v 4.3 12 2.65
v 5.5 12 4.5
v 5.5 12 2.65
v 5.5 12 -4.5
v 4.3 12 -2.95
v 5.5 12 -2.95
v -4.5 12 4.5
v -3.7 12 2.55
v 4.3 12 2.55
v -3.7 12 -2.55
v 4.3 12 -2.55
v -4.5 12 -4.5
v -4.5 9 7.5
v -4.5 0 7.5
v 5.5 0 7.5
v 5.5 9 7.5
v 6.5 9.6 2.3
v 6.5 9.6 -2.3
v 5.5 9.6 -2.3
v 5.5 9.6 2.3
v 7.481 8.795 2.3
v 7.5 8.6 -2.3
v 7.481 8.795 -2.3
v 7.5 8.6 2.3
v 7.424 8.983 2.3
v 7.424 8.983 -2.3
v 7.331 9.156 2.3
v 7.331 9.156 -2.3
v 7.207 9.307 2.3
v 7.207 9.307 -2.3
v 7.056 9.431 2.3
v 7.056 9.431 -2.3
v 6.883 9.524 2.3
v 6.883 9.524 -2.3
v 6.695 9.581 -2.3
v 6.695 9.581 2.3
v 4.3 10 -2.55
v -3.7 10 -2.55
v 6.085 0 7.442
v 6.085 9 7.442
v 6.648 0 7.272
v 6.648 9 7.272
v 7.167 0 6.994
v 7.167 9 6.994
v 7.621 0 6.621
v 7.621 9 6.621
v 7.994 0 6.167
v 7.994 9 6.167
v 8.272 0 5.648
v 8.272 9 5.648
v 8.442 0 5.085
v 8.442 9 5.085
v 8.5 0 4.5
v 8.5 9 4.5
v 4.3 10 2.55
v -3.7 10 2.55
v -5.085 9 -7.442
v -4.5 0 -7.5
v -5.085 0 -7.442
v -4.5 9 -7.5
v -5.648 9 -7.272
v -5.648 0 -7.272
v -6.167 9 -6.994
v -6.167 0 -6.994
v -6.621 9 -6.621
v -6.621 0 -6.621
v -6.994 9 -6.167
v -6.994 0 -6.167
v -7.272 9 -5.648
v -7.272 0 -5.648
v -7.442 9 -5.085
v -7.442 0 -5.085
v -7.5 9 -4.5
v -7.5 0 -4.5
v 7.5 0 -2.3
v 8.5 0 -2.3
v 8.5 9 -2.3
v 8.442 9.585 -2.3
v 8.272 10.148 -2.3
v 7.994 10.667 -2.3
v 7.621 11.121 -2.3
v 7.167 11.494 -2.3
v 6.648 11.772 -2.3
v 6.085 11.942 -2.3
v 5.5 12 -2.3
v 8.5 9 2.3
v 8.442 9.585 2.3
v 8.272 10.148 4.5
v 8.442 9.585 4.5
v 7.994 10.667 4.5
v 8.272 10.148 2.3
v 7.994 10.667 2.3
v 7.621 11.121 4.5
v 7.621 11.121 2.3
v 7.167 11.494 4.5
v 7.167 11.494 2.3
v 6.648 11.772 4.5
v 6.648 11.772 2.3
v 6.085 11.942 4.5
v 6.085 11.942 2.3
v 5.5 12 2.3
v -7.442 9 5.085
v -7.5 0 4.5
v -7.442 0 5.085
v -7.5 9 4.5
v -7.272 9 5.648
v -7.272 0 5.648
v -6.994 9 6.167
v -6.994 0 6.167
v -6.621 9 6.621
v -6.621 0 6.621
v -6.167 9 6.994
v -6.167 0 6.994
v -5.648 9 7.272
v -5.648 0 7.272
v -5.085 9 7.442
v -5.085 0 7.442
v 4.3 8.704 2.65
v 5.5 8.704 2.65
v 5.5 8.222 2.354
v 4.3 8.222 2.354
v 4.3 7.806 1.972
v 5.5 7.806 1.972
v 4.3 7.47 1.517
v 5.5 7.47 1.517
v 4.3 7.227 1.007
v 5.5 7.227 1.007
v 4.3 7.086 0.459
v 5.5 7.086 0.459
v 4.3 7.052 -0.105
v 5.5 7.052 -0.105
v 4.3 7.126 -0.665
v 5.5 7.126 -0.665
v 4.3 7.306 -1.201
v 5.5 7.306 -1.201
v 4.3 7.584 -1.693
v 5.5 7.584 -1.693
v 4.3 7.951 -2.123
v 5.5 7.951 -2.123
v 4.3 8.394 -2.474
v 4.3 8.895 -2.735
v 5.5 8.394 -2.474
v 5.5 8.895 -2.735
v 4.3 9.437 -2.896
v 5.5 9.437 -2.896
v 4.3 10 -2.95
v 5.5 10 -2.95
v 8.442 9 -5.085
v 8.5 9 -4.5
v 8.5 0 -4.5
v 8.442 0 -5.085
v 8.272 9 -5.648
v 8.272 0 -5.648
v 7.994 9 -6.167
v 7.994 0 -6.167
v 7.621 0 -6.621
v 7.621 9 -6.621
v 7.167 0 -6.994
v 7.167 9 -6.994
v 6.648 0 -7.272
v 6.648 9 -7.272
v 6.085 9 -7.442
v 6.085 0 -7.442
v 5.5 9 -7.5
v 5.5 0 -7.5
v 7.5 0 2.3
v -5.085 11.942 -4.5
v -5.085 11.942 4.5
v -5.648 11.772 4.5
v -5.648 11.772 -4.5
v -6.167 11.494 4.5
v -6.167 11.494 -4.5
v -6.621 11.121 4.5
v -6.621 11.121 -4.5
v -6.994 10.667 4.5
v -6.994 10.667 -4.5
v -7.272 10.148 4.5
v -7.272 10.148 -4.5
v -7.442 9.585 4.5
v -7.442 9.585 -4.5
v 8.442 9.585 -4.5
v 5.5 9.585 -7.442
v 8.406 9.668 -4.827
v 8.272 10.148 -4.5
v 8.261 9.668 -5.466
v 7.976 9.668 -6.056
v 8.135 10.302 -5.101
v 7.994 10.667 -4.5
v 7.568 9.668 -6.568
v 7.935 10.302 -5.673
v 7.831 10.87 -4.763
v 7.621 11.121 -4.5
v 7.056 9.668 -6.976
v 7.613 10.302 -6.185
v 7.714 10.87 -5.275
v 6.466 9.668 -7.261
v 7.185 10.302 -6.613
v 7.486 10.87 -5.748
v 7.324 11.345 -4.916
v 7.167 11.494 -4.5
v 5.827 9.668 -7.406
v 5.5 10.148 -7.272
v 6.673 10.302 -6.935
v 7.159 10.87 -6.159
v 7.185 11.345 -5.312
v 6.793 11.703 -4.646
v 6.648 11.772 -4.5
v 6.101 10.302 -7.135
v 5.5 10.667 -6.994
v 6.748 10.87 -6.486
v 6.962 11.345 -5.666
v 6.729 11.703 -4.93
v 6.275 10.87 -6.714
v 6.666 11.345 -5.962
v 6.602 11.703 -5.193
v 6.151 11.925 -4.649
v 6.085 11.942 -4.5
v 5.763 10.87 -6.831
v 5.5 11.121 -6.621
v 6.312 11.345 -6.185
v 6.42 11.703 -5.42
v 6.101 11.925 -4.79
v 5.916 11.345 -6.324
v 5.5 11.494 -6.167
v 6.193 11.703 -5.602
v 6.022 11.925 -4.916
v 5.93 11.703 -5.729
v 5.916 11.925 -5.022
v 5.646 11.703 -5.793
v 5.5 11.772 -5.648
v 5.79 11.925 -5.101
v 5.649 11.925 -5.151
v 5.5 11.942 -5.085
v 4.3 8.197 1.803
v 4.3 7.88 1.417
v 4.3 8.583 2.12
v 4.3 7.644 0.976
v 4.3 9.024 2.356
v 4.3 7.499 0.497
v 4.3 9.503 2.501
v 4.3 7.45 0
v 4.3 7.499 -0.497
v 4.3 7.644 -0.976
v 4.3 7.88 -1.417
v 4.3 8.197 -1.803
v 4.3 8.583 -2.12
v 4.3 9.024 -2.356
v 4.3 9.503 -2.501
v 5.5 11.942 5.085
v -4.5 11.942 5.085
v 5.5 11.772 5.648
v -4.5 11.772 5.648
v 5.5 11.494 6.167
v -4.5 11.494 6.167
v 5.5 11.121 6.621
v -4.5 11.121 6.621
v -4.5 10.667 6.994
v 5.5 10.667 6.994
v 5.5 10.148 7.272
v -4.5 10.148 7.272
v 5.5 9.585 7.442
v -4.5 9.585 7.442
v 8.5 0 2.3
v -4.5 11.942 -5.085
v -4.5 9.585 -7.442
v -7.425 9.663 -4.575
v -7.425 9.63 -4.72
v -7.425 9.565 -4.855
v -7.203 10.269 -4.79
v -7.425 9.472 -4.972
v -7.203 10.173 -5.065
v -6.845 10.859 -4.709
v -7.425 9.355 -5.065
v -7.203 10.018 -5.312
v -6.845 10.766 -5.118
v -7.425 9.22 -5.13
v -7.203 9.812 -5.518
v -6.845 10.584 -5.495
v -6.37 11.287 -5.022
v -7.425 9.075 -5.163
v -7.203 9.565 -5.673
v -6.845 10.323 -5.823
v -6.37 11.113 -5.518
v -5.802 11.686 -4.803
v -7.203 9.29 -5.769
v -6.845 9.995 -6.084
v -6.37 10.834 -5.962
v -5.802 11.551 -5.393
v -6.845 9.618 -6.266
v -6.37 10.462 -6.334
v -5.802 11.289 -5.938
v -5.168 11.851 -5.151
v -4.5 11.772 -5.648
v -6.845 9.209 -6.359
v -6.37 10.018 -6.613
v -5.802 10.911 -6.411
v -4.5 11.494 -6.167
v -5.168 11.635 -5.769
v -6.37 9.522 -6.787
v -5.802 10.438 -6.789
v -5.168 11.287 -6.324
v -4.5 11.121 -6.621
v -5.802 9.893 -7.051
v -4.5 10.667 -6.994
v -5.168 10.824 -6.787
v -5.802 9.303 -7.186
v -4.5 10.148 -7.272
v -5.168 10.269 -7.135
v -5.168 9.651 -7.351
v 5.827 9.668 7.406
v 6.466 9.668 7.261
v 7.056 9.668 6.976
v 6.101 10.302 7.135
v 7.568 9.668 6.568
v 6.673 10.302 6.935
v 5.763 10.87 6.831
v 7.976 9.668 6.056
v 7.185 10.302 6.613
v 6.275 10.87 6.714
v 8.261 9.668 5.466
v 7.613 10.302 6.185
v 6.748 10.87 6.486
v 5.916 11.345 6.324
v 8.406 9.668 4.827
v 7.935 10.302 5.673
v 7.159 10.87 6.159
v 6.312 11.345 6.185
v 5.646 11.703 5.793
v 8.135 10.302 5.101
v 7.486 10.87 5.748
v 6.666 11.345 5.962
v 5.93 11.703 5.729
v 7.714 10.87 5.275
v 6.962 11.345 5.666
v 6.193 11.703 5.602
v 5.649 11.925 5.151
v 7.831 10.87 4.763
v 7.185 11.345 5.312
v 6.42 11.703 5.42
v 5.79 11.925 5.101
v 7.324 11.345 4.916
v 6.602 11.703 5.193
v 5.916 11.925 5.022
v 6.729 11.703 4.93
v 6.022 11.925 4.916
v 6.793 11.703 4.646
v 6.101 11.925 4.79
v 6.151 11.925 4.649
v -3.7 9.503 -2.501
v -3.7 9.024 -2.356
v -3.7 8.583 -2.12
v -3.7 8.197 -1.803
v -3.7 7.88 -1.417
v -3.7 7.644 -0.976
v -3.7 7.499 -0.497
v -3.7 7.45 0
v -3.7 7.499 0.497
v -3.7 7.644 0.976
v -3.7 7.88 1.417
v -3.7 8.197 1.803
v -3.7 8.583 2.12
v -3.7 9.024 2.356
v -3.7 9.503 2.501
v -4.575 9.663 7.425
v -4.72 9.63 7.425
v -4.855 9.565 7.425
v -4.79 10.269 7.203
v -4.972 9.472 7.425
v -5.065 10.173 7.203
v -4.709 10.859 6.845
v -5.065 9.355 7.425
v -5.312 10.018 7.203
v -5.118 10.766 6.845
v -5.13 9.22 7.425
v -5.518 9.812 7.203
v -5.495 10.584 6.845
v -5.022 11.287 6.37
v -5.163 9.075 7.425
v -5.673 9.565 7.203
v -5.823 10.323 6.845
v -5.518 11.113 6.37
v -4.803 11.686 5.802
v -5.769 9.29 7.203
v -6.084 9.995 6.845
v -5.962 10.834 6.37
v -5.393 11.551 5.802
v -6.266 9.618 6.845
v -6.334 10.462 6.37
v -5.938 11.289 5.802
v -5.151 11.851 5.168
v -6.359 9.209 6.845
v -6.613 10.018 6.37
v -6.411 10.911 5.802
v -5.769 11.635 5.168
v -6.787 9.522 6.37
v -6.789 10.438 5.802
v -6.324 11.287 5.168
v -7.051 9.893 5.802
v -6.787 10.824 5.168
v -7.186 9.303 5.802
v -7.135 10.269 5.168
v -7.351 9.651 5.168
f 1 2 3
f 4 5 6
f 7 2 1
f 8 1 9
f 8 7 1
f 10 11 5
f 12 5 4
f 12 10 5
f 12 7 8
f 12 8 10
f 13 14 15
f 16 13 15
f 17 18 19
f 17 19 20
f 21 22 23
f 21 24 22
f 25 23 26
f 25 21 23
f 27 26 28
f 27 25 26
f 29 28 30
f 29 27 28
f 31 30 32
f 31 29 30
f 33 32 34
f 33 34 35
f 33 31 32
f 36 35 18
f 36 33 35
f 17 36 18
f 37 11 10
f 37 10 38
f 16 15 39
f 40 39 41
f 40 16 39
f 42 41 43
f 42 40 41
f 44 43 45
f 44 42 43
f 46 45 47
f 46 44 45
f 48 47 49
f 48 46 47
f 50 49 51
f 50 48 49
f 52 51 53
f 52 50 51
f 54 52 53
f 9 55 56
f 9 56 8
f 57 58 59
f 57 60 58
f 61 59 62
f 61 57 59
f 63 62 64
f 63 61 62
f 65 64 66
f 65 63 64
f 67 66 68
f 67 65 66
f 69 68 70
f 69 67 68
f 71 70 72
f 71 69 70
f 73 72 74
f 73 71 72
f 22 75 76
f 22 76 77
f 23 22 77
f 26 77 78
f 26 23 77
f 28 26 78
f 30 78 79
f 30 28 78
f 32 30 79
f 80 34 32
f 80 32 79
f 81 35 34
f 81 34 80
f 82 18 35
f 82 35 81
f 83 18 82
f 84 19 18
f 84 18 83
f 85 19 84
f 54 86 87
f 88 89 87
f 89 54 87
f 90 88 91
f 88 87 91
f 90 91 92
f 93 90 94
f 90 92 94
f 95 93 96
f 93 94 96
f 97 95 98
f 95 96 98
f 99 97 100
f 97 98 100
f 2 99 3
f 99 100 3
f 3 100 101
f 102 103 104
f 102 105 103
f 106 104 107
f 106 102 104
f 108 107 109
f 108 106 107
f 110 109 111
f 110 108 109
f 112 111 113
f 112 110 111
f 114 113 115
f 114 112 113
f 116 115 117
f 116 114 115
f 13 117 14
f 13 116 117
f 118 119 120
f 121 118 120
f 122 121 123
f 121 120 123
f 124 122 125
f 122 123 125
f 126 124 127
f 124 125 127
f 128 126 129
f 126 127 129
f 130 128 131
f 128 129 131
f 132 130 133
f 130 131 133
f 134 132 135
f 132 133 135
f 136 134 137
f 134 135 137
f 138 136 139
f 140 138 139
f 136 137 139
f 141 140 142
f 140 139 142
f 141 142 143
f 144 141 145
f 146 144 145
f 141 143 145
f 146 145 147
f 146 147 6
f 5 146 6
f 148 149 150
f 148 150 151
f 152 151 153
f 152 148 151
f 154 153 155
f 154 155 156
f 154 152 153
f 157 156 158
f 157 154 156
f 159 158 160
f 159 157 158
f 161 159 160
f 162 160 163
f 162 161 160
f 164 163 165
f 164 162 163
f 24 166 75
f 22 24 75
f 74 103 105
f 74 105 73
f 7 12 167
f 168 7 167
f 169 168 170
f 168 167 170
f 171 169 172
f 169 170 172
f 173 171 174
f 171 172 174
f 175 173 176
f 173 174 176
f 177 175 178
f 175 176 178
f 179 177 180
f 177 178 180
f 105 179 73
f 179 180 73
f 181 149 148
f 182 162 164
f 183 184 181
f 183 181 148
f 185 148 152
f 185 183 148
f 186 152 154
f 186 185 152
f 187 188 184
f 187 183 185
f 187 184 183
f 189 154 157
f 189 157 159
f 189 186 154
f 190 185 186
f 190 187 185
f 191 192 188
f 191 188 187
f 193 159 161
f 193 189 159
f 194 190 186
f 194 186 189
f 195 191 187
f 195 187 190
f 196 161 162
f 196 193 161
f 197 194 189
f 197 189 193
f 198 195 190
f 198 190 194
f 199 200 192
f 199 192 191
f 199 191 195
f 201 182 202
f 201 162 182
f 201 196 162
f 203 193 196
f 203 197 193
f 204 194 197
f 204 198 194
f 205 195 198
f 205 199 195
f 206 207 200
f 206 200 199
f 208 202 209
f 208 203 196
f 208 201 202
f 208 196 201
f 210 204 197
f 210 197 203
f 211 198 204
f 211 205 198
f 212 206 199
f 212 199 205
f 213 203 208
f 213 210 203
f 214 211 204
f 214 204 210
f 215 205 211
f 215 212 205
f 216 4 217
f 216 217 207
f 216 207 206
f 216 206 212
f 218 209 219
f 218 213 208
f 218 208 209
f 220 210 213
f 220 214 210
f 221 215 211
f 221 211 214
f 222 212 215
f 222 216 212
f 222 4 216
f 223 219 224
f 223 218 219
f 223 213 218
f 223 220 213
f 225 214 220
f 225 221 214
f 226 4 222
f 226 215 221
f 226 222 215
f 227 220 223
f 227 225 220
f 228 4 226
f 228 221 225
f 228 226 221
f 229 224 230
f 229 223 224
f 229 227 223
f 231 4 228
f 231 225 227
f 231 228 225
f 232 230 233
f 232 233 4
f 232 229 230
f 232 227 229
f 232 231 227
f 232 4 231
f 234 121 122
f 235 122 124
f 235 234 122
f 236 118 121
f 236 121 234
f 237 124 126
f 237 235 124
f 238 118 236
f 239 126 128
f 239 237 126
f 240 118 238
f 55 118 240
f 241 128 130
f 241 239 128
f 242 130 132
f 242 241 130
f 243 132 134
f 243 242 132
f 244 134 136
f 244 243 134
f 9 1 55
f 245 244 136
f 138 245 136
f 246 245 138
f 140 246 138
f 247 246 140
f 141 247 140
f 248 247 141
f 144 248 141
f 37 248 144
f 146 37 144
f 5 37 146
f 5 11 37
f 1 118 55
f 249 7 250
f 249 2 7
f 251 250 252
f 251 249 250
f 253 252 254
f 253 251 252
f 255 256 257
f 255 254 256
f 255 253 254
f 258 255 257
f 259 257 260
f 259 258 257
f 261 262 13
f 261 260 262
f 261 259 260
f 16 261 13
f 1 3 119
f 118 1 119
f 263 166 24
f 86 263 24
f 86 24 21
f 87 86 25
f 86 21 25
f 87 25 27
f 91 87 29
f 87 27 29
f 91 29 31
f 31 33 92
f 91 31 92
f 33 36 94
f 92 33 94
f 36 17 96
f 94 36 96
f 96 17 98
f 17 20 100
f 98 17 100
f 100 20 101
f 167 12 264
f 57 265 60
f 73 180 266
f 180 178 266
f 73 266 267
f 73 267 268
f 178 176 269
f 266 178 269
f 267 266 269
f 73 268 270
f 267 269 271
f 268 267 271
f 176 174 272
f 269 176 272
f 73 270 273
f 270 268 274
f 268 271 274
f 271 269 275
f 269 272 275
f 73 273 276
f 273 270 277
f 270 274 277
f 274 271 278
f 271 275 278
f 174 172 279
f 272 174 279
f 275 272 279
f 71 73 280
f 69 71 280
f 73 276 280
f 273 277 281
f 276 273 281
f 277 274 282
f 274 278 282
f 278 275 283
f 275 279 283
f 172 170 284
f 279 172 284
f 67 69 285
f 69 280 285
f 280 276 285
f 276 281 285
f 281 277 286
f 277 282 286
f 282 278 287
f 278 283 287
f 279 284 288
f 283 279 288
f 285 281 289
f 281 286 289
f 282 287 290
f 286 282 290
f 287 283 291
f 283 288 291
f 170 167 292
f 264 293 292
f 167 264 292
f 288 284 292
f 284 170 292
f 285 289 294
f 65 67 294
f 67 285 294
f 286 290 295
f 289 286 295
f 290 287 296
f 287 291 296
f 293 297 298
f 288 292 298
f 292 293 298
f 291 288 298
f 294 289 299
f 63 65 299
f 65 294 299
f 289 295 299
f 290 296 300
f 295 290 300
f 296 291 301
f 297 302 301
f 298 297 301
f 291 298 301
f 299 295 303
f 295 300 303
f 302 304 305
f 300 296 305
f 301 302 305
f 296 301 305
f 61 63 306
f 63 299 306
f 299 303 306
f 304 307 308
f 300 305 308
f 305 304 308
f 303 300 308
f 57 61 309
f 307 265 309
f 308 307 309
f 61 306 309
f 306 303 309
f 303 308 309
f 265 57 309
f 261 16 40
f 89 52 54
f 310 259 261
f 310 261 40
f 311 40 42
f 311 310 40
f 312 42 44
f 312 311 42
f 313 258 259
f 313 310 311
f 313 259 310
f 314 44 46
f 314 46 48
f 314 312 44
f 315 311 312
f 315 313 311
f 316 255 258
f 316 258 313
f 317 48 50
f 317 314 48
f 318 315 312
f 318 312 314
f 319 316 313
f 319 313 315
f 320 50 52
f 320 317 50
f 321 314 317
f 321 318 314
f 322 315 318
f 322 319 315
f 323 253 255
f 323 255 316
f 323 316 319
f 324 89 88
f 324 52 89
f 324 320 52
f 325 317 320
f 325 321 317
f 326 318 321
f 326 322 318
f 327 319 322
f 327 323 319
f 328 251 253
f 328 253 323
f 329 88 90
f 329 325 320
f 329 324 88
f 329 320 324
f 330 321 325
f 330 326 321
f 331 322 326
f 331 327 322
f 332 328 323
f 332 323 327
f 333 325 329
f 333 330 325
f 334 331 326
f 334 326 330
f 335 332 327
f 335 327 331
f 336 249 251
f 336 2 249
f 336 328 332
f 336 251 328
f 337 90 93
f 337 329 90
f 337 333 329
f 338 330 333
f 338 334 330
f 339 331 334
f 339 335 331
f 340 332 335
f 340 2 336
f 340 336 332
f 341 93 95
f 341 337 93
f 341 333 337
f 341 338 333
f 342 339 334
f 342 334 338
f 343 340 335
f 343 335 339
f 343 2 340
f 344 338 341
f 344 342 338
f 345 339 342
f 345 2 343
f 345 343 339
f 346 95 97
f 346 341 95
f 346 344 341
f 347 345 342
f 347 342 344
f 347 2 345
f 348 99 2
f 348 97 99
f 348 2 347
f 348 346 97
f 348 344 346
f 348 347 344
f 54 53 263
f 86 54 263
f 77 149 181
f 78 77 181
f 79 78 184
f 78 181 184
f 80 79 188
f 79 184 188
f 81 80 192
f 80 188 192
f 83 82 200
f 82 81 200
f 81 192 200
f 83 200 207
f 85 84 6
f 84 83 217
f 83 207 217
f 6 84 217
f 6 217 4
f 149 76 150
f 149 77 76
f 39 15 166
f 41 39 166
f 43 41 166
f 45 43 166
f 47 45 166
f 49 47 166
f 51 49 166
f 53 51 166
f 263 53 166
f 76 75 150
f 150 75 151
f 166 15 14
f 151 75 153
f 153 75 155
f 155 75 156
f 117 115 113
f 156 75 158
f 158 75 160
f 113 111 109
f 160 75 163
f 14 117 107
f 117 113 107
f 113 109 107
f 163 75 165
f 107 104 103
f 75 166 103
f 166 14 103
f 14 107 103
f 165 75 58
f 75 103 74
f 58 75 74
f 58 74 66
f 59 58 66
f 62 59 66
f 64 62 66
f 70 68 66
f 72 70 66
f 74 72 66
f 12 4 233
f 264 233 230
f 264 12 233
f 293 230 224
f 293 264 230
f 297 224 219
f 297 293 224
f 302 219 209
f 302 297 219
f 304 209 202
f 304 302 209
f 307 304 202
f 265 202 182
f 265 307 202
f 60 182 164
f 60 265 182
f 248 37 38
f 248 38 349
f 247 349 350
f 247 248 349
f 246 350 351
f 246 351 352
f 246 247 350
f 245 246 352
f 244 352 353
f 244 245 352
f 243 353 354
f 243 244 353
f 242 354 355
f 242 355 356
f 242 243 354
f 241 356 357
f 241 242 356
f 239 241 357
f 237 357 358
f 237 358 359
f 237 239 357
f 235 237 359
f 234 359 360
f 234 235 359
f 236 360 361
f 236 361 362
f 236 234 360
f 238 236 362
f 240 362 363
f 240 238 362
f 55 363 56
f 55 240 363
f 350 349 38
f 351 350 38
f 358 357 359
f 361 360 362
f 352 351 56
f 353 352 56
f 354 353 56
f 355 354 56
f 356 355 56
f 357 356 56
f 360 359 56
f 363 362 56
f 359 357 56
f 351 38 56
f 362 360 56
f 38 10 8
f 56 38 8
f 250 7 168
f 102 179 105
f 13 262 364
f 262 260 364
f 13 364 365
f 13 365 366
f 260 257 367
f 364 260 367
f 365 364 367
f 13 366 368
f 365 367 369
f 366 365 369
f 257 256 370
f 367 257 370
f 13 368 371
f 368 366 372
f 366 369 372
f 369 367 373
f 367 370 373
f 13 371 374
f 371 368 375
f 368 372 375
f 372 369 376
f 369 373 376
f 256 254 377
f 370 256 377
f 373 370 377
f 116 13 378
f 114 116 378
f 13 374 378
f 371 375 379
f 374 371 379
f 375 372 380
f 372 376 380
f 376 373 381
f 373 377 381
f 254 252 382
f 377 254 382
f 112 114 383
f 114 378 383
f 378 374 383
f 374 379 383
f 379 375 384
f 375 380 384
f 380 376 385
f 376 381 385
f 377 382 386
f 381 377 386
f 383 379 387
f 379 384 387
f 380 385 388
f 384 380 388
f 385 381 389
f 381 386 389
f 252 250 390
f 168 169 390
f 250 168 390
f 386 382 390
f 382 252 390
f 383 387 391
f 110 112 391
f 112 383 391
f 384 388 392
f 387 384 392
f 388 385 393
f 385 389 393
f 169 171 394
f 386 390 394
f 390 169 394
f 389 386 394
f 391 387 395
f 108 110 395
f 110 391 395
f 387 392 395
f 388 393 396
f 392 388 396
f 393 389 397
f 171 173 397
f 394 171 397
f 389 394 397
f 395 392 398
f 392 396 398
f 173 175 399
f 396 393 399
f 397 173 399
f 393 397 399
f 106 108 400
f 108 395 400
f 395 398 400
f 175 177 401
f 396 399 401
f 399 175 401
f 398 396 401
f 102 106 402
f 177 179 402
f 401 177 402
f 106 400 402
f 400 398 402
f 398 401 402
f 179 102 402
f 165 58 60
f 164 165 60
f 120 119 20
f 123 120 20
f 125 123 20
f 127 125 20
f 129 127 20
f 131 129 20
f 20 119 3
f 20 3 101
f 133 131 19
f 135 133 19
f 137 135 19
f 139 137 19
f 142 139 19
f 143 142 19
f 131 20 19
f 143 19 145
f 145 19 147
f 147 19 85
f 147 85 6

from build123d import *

# Parameters (mm, degrees)
SKETCH1_W           = 15
SKETCH1_H           = 15
BOSS_EXTRUDE1_DEPTH = 12
CUT_EXTRUDE1_DEPTH  = 2
CUT_EXTRUDE2_DEPTH  = 1.2
CUT_EXTRUDE3_DEPTH  = 8
SKETCH5_W           = 5.2
SKETCH5_H           = 12
BOSS_EXTRUDE2_DEPTH = 1
FILLET2_R           = 1
FILLET3_R           = 3
FILLET4_R           = 3


with BuildPart() as part:
    # Sketch1 → Boss-Extrude1 (new body)
    with BuildSketch(Plane(origin=(0, 0, 0), x_dir=(1, 0, 0), z_dir=(0, 1, 0))):
        Rectangle(SKETCH1_W, SKETCH1_H)
    extrude(amount=BOSS_EXTRUDE1_DEPTH)

    # Sketch2 → Cut-Extrude1 (cut)
    with BuildSketch(Plane(origin=(7.5, 0, 0), x_dir=(0, 0, -1), z_dir=(1, 0, 0))):
        Polygon((2.3, 10.4), (2.3, 9.6), (-2.3, 9.6), (-2.3, 10.4), (-2.3, 12), (2.3, 12), align=None)
    extrude(amount=-CUT_EXTRUDE1_DEPTH, mode=Mode.SUBTRACT)

    # Sketch3 → Cut-Extrude2 (cut)
    with BuildSketch(Plane(origin=(5.5, 0, 0), x_dir=(0, 0, -1), z_dir=(1, 0, 0))):
        with BuildLine():
            Line((-2.65, 11.29614814), (-2.65, 8.70385186))
            ThreePointArc((-2.65, 8.70385186), (0.665206735, 7.125978427), (2.95, 10))
            Line((2.95, 10), (2.95, 12))
            Line((2.95, 12), (-2.65, 12))
            Line((-2.65, 12), (-2.65, 11.29614814))
        make_face()
    extrude(amount=-CUT_EXTRUDE2_DEPTH, mode=Mode.SUBTRACT)

    # Sketch4 → Cut-Extrude3 (cut)
    with BuildSketch(Plane(origin=(4.3, 0, 0), x_dir=(0, 0, -1), z_dir=(1, 0, 0))):
        with BuildLine():
            Line((-2.55, 10), (-2.55, 12))
            Line((-2.55, 12), (2.55, 12))
            Line((2.55, 12), (2.55, 10))
            ThreePointArc((2.55, 10), (0, 7.45), (-2.55, 10))
        make_face()
    extrude(amount=-CUT_EXTRUDE3_DEPTH, mode=Mode.SUBTRACT)

    # Sketch5 → Boss-Extrude2 (add)
    with BuildSketch(Plane(origin=(7.5, 0, 0), x_dir=(0, 0, -1), z_dir=(1, 0, 0))):
        with Locations((4.9, 6)):
            Rectangle(SKETCH5_W, SKETCH5_H)
        with Locations((-4.9, 6)):
            Rectangle(SKETCH5_W, SKETCH5_H)
    extrude(amount=BOSS_EXTRUDE2_DEPTH)

    # Fillet2
    fillet2_edges = [part.edges().sort_by_distance(p)[0] for p in [
        (7.5, 9.6, 0),
    ]]
    fillet(fillet2_edges, radius=FILLET2_R)

    # Fillet3
    fillet3_edges = [part.edges().sort_by_distance(p)[0] for p in [
        (0.5, 12, -7.5),
        (-7.5, 12, 0),
        (8.5, 6, 7.5),
        (0.5, 12, 7.5),
        (-7.5, 6, -7.5),
        (8.5, 6, -7.5),
        (-7.5, 6, 7.5),
    ]]
    fillet(fillet3_edges, radius=FILLET3_R)

    # Fillet4
    # the kernel refuses this fillet: 3 mm, written as the material it takes off along each edge
    with BuildSketch(Plane(origin=(5.5, 9, 4.5), x_dir=(1, 0, 0), z_dir=(0, 1, 0))) as fillet4_piece_1_section:
        Polygon((0, 0), (FILLET4_R, 0), (FILLET4_R, -FILLET4_R), (0, -FILLET4_R), align=None)
    fillet4_piece_1 = extrude(amount=FILLET4_R, mode=Mode.PRIVATE)
    fillet4_piece_1 = fillet4_piece_1 - Plane(origin=(5.5, 9, 4.5), x_dir=(-0.7071067811865477, 0, -0.7071067811865475), z_dir=(0, 1, 0)) * Sphere(FILLET4_R, mode=Mode.PRIVATE)
    add(fillet4_piece_1, mode=Mode.SUBTRACT)
    with BuildSketch(Plane(origin=(5.5, 9, -4.5), x_dir=(1, 0, 0), z_dir=(0, 1, 0))) as fillet4_piece_2_section:
        Polygon((0, 0), (FILLET4_R, 0), (FILLET4_R, FILLET4_R), (0, FILLET4_R), align=None)
    fillet4_piece_2 = extrude(amount=FILLET4_R, mode=Mode.PRIVATE)
    fillet4_piece_2 = fillet4_piece_2 - Plane(origin=(5.5, 9, -4.5), x_dir=(-0.7071067811865475, 0, 0.7071067811865476), z_dir=(0, 1, 0)) * Sphere(FILLET4_R, mode=Mode.PRIVATE)
    add(fillet4_piece_2, mode=Mode.SUBTRACT)
    with BuildSketch(Plane(origin=(8.5, 12, -5.2), x_dir=(-1, 0, 0), z_dir=(0, 0, 1)), Plane(origin=(8.5, 12, -4.5), x_dir=(-1, 0, 0), z_dir=(0, 0, 1))) as fillet4_piece_3:
        with BuildLine():
            CenterArc((FILLET4_R, FILLET4_R), FILLET4_R, 180, 90)
            Line((0, FILLET4_R), (0, 0))
            Line((0, 0), (FILLET4_R, 0))
        make_face()
    extrude(amount=9.7, mode=Mode.SUBTRACT)


solid = part.part
